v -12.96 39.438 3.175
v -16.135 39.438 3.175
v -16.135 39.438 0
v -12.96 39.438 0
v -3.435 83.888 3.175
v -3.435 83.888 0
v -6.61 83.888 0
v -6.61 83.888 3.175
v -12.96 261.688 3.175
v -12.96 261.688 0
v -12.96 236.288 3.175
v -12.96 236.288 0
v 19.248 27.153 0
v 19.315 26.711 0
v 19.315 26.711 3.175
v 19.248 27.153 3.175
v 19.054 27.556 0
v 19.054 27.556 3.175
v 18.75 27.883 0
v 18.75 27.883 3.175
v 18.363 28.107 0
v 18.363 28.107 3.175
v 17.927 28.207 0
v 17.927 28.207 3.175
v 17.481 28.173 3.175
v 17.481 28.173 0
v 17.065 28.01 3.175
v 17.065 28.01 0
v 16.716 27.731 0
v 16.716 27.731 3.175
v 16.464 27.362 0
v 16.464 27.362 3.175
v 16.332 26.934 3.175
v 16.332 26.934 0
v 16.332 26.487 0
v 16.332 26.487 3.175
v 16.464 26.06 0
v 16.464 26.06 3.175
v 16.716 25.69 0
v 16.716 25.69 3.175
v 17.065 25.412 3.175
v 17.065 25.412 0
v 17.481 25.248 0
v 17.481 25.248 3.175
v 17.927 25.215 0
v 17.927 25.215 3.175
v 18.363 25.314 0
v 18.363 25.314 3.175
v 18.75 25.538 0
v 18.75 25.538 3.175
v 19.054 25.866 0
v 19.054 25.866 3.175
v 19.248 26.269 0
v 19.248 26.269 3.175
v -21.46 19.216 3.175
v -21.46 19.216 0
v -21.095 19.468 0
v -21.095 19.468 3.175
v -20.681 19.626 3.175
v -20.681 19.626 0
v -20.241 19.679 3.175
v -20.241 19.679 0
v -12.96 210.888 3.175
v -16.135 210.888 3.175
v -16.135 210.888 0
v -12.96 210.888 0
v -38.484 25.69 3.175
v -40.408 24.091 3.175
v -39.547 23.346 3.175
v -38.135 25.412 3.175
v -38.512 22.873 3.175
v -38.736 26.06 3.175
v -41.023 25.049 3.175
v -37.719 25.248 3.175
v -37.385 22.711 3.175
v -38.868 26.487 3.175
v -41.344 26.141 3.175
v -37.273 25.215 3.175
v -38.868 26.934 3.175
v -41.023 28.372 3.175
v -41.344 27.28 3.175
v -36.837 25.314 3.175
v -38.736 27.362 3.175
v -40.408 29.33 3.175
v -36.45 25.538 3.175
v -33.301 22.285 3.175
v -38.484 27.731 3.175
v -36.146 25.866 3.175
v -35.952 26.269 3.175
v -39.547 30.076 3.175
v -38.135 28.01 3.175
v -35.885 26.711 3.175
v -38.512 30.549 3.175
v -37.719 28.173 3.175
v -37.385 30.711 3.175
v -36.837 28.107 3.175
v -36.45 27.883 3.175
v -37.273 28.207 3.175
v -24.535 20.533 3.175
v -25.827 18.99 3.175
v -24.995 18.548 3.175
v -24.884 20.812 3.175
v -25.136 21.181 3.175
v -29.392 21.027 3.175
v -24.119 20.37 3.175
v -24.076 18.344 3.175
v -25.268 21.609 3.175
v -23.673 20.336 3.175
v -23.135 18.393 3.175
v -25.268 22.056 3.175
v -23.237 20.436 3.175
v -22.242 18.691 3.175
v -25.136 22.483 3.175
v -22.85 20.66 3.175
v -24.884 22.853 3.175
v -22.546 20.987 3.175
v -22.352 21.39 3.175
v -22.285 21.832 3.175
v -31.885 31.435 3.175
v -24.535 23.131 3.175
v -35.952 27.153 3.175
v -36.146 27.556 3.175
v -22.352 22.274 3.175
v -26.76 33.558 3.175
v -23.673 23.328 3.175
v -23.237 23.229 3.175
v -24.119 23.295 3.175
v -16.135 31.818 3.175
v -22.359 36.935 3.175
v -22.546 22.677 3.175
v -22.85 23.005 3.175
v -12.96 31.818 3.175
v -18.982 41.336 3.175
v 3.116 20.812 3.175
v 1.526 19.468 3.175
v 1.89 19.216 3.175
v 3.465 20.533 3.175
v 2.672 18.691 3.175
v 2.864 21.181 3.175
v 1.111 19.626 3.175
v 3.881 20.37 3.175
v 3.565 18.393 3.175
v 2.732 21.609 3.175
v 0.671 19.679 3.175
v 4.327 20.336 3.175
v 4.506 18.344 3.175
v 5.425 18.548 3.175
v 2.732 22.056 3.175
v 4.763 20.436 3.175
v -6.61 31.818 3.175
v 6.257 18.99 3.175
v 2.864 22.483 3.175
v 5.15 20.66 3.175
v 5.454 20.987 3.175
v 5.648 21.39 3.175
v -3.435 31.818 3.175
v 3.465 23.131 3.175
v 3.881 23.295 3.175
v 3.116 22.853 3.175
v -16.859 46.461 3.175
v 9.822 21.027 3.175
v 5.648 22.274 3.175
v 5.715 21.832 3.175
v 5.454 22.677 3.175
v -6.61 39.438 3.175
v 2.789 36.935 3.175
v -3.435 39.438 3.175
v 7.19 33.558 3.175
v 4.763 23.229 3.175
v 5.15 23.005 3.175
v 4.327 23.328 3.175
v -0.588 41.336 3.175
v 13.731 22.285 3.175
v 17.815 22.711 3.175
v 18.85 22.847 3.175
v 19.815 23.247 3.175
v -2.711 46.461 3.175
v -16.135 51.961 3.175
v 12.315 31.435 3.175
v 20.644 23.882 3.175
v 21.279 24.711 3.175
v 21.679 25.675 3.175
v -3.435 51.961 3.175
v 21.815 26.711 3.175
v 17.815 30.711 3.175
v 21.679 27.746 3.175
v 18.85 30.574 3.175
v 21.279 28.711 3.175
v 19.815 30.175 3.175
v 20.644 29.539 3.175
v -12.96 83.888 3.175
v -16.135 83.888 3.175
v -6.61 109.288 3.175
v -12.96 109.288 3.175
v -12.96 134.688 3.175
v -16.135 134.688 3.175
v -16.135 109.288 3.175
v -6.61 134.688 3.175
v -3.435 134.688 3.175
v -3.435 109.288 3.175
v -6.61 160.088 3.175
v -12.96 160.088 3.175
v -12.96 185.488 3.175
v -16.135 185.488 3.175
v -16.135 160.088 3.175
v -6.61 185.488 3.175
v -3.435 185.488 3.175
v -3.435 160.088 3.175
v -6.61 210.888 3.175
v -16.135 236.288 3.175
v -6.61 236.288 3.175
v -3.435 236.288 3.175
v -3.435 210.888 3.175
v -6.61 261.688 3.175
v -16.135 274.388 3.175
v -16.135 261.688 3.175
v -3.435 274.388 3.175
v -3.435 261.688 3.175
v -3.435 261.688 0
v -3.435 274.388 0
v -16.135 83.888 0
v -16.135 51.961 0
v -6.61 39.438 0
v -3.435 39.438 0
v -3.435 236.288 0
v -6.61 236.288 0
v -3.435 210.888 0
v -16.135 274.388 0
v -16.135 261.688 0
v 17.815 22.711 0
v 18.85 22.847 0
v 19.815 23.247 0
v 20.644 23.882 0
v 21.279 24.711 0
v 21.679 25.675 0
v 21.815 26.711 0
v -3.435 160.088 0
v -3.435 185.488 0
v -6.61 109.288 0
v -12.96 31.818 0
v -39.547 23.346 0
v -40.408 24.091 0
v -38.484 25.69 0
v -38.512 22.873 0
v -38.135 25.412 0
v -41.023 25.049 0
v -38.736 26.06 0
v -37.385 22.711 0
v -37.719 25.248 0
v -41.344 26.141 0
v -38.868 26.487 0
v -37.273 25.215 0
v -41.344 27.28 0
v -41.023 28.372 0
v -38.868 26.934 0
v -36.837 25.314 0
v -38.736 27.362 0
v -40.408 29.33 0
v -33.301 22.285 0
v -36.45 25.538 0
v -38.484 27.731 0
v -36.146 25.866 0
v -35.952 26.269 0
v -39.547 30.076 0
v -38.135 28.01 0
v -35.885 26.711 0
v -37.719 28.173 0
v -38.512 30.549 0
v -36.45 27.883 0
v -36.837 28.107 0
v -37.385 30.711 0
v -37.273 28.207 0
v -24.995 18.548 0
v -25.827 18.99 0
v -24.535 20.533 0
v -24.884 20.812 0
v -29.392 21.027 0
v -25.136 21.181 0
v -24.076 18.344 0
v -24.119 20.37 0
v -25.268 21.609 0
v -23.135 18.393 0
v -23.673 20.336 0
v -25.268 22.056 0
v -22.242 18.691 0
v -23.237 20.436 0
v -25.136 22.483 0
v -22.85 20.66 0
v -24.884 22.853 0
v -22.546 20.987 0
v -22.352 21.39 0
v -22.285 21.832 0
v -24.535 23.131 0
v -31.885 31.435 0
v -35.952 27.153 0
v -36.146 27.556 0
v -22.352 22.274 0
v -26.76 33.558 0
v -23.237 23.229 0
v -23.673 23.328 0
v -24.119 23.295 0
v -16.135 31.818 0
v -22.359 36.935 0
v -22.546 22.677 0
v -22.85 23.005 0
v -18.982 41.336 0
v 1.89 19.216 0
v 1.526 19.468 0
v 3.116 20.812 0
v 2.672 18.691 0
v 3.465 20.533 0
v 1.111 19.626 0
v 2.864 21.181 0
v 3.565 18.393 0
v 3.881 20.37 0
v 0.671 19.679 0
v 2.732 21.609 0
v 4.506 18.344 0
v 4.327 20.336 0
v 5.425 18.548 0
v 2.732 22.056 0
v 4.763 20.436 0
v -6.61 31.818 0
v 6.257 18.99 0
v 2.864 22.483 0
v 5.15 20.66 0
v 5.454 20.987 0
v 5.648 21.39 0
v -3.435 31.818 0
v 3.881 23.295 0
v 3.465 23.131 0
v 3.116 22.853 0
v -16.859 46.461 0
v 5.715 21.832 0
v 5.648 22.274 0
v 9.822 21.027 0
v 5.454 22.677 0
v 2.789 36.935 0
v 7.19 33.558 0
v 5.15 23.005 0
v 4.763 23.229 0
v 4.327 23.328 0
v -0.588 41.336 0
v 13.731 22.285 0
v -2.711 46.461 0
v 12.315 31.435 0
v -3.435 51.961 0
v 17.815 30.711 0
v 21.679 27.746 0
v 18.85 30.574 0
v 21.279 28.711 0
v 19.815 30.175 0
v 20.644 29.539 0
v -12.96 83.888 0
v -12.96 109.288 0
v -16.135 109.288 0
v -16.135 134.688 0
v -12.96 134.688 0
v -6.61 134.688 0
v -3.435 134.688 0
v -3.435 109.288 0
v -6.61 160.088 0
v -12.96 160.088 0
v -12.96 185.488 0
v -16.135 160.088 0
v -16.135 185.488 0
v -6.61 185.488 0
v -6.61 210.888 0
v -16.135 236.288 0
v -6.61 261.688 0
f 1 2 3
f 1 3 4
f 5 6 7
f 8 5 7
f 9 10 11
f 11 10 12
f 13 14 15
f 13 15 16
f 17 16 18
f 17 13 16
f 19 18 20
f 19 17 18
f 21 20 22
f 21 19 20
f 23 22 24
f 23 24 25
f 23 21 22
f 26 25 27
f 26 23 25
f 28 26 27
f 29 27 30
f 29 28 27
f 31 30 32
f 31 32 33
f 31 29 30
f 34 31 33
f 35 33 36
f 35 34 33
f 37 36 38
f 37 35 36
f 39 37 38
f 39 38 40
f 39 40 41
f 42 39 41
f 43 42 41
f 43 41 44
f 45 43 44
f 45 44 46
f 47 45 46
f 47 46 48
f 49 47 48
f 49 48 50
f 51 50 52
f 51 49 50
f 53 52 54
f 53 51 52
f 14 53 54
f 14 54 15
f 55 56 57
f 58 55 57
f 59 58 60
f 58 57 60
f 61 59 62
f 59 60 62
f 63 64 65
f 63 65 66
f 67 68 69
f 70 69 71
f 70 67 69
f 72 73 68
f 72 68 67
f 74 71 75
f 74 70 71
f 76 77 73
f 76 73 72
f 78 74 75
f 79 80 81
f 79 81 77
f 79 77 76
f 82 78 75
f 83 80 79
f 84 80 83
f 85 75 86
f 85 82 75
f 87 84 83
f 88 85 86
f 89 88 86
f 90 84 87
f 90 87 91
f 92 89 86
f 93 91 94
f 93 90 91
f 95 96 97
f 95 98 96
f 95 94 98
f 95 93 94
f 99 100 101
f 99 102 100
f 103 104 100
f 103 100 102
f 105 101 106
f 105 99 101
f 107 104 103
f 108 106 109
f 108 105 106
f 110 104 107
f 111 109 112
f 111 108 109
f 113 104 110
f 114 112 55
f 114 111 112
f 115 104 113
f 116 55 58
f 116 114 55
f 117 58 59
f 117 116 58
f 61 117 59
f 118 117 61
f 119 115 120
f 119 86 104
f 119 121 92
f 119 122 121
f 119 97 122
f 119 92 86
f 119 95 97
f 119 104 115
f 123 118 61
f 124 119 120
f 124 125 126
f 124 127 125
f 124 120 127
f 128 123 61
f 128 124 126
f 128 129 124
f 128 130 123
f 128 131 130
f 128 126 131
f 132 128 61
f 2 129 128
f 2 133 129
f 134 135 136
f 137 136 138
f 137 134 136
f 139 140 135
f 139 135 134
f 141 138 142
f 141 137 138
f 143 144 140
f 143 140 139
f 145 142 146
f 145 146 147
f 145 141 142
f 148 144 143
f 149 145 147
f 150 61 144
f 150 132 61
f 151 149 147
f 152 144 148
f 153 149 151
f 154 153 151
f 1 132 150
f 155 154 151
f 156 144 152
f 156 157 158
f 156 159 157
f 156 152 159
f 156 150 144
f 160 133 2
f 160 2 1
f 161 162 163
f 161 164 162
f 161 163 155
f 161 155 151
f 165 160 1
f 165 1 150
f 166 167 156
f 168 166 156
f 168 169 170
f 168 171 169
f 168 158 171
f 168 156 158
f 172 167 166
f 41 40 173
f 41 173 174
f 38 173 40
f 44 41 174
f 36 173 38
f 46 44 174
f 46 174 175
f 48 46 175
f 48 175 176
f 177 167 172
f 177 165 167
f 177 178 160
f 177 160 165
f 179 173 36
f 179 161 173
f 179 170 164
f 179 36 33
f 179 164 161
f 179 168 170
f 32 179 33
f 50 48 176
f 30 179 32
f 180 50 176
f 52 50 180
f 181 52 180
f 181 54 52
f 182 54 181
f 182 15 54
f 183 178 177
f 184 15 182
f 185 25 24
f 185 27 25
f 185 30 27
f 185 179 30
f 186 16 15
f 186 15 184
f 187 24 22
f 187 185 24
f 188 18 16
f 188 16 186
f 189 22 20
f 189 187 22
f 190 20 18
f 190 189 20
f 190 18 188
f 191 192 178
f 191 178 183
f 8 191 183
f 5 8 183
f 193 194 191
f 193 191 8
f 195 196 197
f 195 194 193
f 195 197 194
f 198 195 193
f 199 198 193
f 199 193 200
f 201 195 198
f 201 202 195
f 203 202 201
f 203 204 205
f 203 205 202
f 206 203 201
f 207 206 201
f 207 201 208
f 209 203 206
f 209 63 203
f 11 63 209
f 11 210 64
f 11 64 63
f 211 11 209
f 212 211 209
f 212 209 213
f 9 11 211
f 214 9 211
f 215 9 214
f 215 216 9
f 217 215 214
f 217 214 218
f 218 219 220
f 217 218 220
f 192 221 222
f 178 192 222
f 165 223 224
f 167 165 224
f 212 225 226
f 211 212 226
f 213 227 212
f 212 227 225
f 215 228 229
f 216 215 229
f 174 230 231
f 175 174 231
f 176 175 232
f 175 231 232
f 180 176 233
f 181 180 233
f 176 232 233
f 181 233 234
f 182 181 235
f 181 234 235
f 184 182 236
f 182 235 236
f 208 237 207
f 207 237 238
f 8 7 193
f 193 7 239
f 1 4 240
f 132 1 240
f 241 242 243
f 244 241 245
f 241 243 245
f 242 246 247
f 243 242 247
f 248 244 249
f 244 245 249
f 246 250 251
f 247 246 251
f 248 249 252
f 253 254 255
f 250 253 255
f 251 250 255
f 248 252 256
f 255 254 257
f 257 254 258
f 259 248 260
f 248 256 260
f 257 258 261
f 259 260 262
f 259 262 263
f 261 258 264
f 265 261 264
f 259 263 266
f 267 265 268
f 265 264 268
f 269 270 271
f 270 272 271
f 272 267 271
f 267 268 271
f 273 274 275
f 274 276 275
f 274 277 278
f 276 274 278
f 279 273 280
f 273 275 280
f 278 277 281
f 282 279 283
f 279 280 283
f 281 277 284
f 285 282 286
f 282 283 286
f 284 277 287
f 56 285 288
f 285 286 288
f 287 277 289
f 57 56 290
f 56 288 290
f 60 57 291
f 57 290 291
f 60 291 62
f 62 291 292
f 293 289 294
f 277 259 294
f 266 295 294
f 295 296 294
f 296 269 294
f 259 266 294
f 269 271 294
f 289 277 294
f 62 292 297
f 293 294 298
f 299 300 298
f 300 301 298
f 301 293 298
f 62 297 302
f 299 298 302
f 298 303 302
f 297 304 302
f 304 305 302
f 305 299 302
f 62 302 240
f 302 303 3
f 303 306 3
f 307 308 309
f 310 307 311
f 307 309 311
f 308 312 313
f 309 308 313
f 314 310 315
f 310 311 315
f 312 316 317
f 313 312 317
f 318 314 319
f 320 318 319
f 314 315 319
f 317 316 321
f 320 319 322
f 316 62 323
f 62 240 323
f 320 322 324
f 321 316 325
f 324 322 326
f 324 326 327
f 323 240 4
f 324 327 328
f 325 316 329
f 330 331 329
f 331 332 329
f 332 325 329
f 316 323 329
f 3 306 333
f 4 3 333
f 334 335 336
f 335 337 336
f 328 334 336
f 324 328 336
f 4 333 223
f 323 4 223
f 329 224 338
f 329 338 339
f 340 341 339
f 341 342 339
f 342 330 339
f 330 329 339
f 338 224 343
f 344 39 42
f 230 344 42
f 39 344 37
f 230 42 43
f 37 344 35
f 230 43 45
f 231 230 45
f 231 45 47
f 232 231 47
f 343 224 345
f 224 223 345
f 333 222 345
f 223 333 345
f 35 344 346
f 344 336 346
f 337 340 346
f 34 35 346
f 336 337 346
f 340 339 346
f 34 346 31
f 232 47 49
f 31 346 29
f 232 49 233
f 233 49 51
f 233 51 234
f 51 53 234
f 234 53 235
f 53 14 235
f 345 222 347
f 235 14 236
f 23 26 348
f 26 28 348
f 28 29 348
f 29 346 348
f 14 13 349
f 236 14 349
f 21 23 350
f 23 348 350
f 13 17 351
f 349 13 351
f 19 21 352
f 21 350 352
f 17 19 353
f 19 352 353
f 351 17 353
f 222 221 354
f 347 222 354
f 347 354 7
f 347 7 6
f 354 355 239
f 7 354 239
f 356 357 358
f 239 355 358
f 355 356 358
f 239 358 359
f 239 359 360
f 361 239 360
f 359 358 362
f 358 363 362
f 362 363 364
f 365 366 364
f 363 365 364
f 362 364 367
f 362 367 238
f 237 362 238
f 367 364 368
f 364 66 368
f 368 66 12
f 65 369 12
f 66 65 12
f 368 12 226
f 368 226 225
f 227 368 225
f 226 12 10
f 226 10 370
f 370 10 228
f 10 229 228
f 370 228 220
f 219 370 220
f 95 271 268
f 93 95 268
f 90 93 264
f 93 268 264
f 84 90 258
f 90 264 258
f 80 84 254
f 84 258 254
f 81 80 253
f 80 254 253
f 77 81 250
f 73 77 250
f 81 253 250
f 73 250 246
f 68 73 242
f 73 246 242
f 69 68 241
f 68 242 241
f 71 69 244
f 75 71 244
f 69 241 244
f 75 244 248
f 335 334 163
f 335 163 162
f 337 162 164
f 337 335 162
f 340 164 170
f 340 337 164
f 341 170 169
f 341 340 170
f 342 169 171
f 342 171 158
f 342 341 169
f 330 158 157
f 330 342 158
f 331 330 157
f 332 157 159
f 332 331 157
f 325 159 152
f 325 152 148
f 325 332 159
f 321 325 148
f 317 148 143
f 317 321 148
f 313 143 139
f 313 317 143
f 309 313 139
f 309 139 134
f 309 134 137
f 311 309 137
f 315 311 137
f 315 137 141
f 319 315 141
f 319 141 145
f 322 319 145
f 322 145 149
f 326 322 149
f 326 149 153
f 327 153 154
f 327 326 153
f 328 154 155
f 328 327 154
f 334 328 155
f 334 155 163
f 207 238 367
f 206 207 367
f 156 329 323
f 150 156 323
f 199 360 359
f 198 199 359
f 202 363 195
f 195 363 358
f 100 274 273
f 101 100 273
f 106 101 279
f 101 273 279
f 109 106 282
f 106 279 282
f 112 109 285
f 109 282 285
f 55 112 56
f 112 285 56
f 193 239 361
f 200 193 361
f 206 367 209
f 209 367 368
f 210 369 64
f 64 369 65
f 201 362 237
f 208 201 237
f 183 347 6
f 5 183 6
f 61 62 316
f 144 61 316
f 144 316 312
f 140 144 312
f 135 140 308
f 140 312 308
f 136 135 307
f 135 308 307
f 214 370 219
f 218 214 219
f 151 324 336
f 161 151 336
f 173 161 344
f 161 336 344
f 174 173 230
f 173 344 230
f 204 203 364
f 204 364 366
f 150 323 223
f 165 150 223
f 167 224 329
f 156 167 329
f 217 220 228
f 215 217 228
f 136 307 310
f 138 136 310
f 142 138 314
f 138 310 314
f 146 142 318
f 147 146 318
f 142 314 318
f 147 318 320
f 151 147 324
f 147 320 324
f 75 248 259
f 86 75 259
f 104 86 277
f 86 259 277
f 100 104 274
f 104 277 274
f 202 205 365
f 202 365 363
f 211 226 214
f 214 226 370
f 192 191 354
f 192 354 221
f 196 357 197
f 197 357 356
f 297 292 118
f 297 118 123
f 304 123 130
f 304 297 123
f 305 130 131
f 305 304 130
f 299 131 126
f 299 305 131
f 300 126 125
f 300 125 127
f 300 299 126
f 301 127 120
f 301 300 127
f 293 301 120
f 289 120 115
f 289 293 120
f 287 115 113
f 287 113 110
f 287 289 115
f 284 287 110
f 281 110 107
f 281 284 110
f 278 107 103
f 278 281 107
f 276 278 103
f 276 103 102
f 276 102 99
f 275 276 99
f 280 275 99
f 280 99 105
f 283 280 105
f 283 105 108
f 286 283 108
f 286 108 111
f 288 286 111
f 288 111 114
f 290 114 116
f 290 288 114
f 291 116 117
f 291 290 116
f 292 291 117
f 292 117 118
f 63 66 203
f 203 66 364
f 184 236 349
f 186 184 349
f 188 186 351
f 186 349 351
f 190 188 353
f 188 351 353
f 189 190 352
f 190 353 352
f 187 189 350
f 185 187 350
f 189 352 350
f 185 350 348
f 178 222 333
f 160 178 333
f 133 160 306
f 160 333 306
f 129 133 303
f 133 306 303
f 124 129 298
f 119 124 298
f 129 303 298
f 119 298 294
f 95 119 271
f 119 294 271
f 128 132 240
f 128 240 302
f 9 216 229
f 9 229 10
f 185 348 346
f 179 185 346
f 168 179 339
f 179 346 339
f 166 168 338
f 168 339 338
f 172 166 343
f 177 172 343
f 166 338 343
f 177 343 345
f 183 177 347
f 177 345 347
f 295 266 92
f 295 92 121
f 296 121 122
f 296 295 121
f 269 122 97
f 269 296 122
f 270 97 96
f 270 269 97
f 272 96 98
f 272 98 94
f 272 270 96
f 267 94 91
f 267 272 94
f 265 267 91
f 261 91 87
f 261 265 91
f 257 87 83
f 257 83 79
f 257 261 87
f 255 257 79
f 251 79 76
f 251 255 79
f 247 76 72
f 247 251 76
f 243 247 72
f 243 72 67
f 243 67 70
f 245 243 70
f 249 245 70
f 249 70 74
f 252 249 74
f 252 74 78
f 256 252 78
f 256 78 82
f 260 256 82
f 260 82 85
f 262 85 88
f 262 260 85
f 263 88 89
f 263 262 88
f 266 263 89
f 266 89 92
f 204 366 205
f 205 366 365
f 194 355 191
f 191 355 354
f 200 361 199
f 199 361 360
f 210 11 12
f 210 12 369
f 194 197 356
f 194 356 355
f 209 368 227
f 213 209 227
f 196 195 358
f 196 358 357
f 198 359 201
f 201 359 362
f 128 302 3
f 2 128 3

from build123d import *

# Parameters (mm, degrees)
F0_R     = 1.5
F1_DEPTH = 3.175


# Not quite as in the source:
# - a length typed as a fraction of an inch, garbled in the dataset ("3 / 203.2 mm" for 3/8 in), is restored
# - a feature names something its author has since deleted; it is built from what else it names


with BuildPart() as f1:
    # F0 (on Top) → F1 (new body)
    with BuildSketch(Plane.XY):
        with BuildLine():
            ThreePointArc((-33.3848889083, 26.7107070004), (-34.5564617835, 29.5391341252), (-37.3848889083, 30.7107070004))
            ThreePointArc((-37.3848889083, 30.7107070004), (-41.3848889083, 26.7107070004), (-37.3848889083, 22.7107070004))
            ThreePointArc((-37.3848889083, 22.7107070004), (-34.5564617835, 23.8822798757), (-33.3848889083, 26.7107070004))
        make_face()
        with Locations((-37.3848889083, 26.7107070004)):
            Circle(F0_R, mode=Mode.SUBTRACT)
        with BuildLine():
            Line((-3.4348889083, 20.3883182257), (-16.1348889083, 20.3883182257))
            Line((-16.1348889083, 20.3883182257), (-16.1348889083, 31.8183182257))
            Line((-16.1348889083, 31.8183182257), (-16.1348889083, 39.4383182257))
            Line((-16.1348889083, 39.4383182257), (-16.1348889083, 51.9607070004))
            ThreePointArc((-16.1348889083, 51.9607070004), (-22.3588698081, 36.9346879002), (-37.3848889083, 30.7107070004))
            ThreePointArc((-37.3848889083, 30.7107070004), (-34.5564617835, 29.5391341252), (-33.3848889083, 26.7107070004))
            ThreePointArc((-33.3848889083, 26.7107070004), (-34.5564617835, 23.8822798757), (-37.3848889083, 22.7107070004))
            ThreePointArc((-37.3848889083, 22.7107070004), (-31.3137586061, 21.7575229445), (-25.8268376377, 18.9896932393))
            ThreePointArc((-25.8268376377, 18.9896932393), (-25.3822585347, 24.9465327374), (-20.2848889083, 21.8323056621))
            ThreePointArc((-20.2848889083, 21.8323056621), (-20.5921773878, 20.3982229772), (-21.4600849924, 19.215955771))
            ThreePointArc((-21.4600849924, 19.215955771), (-20.8930268384, 19.5596143827), (-20.2408664312, 19.6793766243))
            Line((-20.2408664312, 19.6793766243), (0.6710886146, 19.6793766243))
            ThreePointArc((0.6710886146, 19.6793766243), (1.3232490219, 19.5596143827), (1.8903071759, 19.215955771))
            ThreePointArc((1.8903071759, 19.215955771), (2.7810284068, 25.0250171826), (7.7151110917, 21.8323056621))
            ThreePointArc((7.7151110917, 21.8323056621), (7.329338167, 20.2349360357), (6.2570598212, 18.9896932393))
            ThreePointArc((6.2570598212, 18.9896932393), (11.7439807896, 21.7575229445), (17.8151110917, 22.7107070004))
            ThreePointArc((17.8151110917, 22.7107070004), (13.8151110917, 26.7107070004), (17.8151110917, 30.7107070004))
            ThreePointArc((17.8151110917, 30.7107070004), (2.7890919915, 36.9346879002), (-3.4348889083, 51.9607070004))
            Line((-3.4348889083, 51.9607070004), (-3.4348889083, 39.4383182257))
            Line((-3.4348889083, 39.4383182257), (-3.4348889083, 31.8183182257))
            Line((-3.4348889083, 31.8183182257), (-3.4348889083, 20.3883182257))
        make_face()
        Polygon((-16.1348889083, 31.8183182257), (-16.1348889083, 20.3883182257), (-3.4348889083, 20.3883182257), (-3.4348889083, 31.8183182257), (-6.6098889083, 31.8183182257), (-6.6098889083, 39.4383182257), (-3.4348889083, 39.4383182257), (-3.4348889083, 51.9607070004), (-3.4348889083, 83.8883182257), (-6.6098889083, 83.8883182257), (-6.6098889083, 109.2883182257), (-3.4348889083, 109.2883182257), (-3.4348889083, 134.6883182257), (-6.6098889083, 134.6883182257), (-6.6098889083, 160.0883182257), (-3.4348889083, 160.0883182257), (-3.4348889083, 185.4883182257), (-6.6098889083, 185.4883182257), (-6.6098889083, 210.8883182257), (-3.4348889083, 210.8883182257), (-3.4348889083, 236.2883182257), (-6.6098889083, 236.2883182257), (-6.6098889083, 261.6883182257), (-3.4348889083, 261.6883182257), (-3.4348889083, 274.3883182257), (-16.1348889083, 274.3883182257), (-16.1348889083, 261.6883182257), (-12.9598889083, 261.6883182257), (-12.9598889083, 236.2883182257), (-16.1348889083, 236.2883182257), (-16.1348889083, 210.8883182257), (-12.9598889083, 210.8883182257), (-12.9598889083, 185.4883182257), (-16.1348889083, 185.4883182257), (-16.1348889083, 160.0883182257), (-12.9598889083, 160.0883182257), (-12.9598889083, 134.6883182257), (-16.1348889083, 134.6883182257), (-16.1348889083, 109.2883182257), (-12.9598889083, 109.2883182257), (-12.9598889083, 83.8883182257), (-16.1348889083, 83.8883182257), (-16.1348889083, 51.9607070004), (-16.1348889083, 39.4383182257), (-12.9598889083, 39.4383182257), (-12.9598889083, 31.8183182257), align=None)
        with BuildLine():
            ThreePointArc((21.8151110917, 26.7107070004), (20.6435382165, 29.5391341252), (17.8151110917, 30.7107070004))
            ThreePointArc((17.8151110917, 30.7107070004), (13.8151110917, 26.7107070004), (17.8151110917, 22.7107070004))
            ThreePointArc((17.8151110917, 22.7107070004), (20.6435382165, 23.8822798757), (21.8151110917, 26.7107070004))
        make_face()
        with Locations((17.8151110917, 26.7107070004)):
            Circle(F0_R, mode=Mode.SUBTRACT)
        with BuildLine():
            ThreePointArc((-20.2848889083, 21.8323056621), (-25.3822585347, 24.9465327374), (-25.8268376377, 18.9896932393))
            ThreePointArc((-25.8268376377, 18.9896932393), (-23.6037799702, 18.3369945812), (-21.4600849924, 19.215955771))
            ThreePointArc((-21.4600849924, 19.215955771), (-20.5921773878, 20.3982229772), (-20.2848889083, 21.8323056621))
        make_face()
        with Locations((-23.7848889083, 21.8323056621)):
            Circle(F0_R, mode=Mode.SUBTRACT)
        with BuildLine():
            ThreePointArc((1.8903071759, 19.215955771), (4.0340021537, 18.3369945812), (6.2570598212, 18.9896932393))
            ThreePointArc((6.2570598212, 18.9896932393), (7.329338167, 20.2349360357), (7.7151110917, 21.8323056621))
            ThreePointArc((7.7151110917, 21.8323056621), (2.7810284068, 25.0250171826), (1.8903071759, 19.215955771))
        make_face()
        with Locations((4.2151110917, 21.8323056621)):
            Circle(F0_R, mode=Mode.SUBTRACT)
    extrude(amount=F1_DEPTH)


solid = f1.part
